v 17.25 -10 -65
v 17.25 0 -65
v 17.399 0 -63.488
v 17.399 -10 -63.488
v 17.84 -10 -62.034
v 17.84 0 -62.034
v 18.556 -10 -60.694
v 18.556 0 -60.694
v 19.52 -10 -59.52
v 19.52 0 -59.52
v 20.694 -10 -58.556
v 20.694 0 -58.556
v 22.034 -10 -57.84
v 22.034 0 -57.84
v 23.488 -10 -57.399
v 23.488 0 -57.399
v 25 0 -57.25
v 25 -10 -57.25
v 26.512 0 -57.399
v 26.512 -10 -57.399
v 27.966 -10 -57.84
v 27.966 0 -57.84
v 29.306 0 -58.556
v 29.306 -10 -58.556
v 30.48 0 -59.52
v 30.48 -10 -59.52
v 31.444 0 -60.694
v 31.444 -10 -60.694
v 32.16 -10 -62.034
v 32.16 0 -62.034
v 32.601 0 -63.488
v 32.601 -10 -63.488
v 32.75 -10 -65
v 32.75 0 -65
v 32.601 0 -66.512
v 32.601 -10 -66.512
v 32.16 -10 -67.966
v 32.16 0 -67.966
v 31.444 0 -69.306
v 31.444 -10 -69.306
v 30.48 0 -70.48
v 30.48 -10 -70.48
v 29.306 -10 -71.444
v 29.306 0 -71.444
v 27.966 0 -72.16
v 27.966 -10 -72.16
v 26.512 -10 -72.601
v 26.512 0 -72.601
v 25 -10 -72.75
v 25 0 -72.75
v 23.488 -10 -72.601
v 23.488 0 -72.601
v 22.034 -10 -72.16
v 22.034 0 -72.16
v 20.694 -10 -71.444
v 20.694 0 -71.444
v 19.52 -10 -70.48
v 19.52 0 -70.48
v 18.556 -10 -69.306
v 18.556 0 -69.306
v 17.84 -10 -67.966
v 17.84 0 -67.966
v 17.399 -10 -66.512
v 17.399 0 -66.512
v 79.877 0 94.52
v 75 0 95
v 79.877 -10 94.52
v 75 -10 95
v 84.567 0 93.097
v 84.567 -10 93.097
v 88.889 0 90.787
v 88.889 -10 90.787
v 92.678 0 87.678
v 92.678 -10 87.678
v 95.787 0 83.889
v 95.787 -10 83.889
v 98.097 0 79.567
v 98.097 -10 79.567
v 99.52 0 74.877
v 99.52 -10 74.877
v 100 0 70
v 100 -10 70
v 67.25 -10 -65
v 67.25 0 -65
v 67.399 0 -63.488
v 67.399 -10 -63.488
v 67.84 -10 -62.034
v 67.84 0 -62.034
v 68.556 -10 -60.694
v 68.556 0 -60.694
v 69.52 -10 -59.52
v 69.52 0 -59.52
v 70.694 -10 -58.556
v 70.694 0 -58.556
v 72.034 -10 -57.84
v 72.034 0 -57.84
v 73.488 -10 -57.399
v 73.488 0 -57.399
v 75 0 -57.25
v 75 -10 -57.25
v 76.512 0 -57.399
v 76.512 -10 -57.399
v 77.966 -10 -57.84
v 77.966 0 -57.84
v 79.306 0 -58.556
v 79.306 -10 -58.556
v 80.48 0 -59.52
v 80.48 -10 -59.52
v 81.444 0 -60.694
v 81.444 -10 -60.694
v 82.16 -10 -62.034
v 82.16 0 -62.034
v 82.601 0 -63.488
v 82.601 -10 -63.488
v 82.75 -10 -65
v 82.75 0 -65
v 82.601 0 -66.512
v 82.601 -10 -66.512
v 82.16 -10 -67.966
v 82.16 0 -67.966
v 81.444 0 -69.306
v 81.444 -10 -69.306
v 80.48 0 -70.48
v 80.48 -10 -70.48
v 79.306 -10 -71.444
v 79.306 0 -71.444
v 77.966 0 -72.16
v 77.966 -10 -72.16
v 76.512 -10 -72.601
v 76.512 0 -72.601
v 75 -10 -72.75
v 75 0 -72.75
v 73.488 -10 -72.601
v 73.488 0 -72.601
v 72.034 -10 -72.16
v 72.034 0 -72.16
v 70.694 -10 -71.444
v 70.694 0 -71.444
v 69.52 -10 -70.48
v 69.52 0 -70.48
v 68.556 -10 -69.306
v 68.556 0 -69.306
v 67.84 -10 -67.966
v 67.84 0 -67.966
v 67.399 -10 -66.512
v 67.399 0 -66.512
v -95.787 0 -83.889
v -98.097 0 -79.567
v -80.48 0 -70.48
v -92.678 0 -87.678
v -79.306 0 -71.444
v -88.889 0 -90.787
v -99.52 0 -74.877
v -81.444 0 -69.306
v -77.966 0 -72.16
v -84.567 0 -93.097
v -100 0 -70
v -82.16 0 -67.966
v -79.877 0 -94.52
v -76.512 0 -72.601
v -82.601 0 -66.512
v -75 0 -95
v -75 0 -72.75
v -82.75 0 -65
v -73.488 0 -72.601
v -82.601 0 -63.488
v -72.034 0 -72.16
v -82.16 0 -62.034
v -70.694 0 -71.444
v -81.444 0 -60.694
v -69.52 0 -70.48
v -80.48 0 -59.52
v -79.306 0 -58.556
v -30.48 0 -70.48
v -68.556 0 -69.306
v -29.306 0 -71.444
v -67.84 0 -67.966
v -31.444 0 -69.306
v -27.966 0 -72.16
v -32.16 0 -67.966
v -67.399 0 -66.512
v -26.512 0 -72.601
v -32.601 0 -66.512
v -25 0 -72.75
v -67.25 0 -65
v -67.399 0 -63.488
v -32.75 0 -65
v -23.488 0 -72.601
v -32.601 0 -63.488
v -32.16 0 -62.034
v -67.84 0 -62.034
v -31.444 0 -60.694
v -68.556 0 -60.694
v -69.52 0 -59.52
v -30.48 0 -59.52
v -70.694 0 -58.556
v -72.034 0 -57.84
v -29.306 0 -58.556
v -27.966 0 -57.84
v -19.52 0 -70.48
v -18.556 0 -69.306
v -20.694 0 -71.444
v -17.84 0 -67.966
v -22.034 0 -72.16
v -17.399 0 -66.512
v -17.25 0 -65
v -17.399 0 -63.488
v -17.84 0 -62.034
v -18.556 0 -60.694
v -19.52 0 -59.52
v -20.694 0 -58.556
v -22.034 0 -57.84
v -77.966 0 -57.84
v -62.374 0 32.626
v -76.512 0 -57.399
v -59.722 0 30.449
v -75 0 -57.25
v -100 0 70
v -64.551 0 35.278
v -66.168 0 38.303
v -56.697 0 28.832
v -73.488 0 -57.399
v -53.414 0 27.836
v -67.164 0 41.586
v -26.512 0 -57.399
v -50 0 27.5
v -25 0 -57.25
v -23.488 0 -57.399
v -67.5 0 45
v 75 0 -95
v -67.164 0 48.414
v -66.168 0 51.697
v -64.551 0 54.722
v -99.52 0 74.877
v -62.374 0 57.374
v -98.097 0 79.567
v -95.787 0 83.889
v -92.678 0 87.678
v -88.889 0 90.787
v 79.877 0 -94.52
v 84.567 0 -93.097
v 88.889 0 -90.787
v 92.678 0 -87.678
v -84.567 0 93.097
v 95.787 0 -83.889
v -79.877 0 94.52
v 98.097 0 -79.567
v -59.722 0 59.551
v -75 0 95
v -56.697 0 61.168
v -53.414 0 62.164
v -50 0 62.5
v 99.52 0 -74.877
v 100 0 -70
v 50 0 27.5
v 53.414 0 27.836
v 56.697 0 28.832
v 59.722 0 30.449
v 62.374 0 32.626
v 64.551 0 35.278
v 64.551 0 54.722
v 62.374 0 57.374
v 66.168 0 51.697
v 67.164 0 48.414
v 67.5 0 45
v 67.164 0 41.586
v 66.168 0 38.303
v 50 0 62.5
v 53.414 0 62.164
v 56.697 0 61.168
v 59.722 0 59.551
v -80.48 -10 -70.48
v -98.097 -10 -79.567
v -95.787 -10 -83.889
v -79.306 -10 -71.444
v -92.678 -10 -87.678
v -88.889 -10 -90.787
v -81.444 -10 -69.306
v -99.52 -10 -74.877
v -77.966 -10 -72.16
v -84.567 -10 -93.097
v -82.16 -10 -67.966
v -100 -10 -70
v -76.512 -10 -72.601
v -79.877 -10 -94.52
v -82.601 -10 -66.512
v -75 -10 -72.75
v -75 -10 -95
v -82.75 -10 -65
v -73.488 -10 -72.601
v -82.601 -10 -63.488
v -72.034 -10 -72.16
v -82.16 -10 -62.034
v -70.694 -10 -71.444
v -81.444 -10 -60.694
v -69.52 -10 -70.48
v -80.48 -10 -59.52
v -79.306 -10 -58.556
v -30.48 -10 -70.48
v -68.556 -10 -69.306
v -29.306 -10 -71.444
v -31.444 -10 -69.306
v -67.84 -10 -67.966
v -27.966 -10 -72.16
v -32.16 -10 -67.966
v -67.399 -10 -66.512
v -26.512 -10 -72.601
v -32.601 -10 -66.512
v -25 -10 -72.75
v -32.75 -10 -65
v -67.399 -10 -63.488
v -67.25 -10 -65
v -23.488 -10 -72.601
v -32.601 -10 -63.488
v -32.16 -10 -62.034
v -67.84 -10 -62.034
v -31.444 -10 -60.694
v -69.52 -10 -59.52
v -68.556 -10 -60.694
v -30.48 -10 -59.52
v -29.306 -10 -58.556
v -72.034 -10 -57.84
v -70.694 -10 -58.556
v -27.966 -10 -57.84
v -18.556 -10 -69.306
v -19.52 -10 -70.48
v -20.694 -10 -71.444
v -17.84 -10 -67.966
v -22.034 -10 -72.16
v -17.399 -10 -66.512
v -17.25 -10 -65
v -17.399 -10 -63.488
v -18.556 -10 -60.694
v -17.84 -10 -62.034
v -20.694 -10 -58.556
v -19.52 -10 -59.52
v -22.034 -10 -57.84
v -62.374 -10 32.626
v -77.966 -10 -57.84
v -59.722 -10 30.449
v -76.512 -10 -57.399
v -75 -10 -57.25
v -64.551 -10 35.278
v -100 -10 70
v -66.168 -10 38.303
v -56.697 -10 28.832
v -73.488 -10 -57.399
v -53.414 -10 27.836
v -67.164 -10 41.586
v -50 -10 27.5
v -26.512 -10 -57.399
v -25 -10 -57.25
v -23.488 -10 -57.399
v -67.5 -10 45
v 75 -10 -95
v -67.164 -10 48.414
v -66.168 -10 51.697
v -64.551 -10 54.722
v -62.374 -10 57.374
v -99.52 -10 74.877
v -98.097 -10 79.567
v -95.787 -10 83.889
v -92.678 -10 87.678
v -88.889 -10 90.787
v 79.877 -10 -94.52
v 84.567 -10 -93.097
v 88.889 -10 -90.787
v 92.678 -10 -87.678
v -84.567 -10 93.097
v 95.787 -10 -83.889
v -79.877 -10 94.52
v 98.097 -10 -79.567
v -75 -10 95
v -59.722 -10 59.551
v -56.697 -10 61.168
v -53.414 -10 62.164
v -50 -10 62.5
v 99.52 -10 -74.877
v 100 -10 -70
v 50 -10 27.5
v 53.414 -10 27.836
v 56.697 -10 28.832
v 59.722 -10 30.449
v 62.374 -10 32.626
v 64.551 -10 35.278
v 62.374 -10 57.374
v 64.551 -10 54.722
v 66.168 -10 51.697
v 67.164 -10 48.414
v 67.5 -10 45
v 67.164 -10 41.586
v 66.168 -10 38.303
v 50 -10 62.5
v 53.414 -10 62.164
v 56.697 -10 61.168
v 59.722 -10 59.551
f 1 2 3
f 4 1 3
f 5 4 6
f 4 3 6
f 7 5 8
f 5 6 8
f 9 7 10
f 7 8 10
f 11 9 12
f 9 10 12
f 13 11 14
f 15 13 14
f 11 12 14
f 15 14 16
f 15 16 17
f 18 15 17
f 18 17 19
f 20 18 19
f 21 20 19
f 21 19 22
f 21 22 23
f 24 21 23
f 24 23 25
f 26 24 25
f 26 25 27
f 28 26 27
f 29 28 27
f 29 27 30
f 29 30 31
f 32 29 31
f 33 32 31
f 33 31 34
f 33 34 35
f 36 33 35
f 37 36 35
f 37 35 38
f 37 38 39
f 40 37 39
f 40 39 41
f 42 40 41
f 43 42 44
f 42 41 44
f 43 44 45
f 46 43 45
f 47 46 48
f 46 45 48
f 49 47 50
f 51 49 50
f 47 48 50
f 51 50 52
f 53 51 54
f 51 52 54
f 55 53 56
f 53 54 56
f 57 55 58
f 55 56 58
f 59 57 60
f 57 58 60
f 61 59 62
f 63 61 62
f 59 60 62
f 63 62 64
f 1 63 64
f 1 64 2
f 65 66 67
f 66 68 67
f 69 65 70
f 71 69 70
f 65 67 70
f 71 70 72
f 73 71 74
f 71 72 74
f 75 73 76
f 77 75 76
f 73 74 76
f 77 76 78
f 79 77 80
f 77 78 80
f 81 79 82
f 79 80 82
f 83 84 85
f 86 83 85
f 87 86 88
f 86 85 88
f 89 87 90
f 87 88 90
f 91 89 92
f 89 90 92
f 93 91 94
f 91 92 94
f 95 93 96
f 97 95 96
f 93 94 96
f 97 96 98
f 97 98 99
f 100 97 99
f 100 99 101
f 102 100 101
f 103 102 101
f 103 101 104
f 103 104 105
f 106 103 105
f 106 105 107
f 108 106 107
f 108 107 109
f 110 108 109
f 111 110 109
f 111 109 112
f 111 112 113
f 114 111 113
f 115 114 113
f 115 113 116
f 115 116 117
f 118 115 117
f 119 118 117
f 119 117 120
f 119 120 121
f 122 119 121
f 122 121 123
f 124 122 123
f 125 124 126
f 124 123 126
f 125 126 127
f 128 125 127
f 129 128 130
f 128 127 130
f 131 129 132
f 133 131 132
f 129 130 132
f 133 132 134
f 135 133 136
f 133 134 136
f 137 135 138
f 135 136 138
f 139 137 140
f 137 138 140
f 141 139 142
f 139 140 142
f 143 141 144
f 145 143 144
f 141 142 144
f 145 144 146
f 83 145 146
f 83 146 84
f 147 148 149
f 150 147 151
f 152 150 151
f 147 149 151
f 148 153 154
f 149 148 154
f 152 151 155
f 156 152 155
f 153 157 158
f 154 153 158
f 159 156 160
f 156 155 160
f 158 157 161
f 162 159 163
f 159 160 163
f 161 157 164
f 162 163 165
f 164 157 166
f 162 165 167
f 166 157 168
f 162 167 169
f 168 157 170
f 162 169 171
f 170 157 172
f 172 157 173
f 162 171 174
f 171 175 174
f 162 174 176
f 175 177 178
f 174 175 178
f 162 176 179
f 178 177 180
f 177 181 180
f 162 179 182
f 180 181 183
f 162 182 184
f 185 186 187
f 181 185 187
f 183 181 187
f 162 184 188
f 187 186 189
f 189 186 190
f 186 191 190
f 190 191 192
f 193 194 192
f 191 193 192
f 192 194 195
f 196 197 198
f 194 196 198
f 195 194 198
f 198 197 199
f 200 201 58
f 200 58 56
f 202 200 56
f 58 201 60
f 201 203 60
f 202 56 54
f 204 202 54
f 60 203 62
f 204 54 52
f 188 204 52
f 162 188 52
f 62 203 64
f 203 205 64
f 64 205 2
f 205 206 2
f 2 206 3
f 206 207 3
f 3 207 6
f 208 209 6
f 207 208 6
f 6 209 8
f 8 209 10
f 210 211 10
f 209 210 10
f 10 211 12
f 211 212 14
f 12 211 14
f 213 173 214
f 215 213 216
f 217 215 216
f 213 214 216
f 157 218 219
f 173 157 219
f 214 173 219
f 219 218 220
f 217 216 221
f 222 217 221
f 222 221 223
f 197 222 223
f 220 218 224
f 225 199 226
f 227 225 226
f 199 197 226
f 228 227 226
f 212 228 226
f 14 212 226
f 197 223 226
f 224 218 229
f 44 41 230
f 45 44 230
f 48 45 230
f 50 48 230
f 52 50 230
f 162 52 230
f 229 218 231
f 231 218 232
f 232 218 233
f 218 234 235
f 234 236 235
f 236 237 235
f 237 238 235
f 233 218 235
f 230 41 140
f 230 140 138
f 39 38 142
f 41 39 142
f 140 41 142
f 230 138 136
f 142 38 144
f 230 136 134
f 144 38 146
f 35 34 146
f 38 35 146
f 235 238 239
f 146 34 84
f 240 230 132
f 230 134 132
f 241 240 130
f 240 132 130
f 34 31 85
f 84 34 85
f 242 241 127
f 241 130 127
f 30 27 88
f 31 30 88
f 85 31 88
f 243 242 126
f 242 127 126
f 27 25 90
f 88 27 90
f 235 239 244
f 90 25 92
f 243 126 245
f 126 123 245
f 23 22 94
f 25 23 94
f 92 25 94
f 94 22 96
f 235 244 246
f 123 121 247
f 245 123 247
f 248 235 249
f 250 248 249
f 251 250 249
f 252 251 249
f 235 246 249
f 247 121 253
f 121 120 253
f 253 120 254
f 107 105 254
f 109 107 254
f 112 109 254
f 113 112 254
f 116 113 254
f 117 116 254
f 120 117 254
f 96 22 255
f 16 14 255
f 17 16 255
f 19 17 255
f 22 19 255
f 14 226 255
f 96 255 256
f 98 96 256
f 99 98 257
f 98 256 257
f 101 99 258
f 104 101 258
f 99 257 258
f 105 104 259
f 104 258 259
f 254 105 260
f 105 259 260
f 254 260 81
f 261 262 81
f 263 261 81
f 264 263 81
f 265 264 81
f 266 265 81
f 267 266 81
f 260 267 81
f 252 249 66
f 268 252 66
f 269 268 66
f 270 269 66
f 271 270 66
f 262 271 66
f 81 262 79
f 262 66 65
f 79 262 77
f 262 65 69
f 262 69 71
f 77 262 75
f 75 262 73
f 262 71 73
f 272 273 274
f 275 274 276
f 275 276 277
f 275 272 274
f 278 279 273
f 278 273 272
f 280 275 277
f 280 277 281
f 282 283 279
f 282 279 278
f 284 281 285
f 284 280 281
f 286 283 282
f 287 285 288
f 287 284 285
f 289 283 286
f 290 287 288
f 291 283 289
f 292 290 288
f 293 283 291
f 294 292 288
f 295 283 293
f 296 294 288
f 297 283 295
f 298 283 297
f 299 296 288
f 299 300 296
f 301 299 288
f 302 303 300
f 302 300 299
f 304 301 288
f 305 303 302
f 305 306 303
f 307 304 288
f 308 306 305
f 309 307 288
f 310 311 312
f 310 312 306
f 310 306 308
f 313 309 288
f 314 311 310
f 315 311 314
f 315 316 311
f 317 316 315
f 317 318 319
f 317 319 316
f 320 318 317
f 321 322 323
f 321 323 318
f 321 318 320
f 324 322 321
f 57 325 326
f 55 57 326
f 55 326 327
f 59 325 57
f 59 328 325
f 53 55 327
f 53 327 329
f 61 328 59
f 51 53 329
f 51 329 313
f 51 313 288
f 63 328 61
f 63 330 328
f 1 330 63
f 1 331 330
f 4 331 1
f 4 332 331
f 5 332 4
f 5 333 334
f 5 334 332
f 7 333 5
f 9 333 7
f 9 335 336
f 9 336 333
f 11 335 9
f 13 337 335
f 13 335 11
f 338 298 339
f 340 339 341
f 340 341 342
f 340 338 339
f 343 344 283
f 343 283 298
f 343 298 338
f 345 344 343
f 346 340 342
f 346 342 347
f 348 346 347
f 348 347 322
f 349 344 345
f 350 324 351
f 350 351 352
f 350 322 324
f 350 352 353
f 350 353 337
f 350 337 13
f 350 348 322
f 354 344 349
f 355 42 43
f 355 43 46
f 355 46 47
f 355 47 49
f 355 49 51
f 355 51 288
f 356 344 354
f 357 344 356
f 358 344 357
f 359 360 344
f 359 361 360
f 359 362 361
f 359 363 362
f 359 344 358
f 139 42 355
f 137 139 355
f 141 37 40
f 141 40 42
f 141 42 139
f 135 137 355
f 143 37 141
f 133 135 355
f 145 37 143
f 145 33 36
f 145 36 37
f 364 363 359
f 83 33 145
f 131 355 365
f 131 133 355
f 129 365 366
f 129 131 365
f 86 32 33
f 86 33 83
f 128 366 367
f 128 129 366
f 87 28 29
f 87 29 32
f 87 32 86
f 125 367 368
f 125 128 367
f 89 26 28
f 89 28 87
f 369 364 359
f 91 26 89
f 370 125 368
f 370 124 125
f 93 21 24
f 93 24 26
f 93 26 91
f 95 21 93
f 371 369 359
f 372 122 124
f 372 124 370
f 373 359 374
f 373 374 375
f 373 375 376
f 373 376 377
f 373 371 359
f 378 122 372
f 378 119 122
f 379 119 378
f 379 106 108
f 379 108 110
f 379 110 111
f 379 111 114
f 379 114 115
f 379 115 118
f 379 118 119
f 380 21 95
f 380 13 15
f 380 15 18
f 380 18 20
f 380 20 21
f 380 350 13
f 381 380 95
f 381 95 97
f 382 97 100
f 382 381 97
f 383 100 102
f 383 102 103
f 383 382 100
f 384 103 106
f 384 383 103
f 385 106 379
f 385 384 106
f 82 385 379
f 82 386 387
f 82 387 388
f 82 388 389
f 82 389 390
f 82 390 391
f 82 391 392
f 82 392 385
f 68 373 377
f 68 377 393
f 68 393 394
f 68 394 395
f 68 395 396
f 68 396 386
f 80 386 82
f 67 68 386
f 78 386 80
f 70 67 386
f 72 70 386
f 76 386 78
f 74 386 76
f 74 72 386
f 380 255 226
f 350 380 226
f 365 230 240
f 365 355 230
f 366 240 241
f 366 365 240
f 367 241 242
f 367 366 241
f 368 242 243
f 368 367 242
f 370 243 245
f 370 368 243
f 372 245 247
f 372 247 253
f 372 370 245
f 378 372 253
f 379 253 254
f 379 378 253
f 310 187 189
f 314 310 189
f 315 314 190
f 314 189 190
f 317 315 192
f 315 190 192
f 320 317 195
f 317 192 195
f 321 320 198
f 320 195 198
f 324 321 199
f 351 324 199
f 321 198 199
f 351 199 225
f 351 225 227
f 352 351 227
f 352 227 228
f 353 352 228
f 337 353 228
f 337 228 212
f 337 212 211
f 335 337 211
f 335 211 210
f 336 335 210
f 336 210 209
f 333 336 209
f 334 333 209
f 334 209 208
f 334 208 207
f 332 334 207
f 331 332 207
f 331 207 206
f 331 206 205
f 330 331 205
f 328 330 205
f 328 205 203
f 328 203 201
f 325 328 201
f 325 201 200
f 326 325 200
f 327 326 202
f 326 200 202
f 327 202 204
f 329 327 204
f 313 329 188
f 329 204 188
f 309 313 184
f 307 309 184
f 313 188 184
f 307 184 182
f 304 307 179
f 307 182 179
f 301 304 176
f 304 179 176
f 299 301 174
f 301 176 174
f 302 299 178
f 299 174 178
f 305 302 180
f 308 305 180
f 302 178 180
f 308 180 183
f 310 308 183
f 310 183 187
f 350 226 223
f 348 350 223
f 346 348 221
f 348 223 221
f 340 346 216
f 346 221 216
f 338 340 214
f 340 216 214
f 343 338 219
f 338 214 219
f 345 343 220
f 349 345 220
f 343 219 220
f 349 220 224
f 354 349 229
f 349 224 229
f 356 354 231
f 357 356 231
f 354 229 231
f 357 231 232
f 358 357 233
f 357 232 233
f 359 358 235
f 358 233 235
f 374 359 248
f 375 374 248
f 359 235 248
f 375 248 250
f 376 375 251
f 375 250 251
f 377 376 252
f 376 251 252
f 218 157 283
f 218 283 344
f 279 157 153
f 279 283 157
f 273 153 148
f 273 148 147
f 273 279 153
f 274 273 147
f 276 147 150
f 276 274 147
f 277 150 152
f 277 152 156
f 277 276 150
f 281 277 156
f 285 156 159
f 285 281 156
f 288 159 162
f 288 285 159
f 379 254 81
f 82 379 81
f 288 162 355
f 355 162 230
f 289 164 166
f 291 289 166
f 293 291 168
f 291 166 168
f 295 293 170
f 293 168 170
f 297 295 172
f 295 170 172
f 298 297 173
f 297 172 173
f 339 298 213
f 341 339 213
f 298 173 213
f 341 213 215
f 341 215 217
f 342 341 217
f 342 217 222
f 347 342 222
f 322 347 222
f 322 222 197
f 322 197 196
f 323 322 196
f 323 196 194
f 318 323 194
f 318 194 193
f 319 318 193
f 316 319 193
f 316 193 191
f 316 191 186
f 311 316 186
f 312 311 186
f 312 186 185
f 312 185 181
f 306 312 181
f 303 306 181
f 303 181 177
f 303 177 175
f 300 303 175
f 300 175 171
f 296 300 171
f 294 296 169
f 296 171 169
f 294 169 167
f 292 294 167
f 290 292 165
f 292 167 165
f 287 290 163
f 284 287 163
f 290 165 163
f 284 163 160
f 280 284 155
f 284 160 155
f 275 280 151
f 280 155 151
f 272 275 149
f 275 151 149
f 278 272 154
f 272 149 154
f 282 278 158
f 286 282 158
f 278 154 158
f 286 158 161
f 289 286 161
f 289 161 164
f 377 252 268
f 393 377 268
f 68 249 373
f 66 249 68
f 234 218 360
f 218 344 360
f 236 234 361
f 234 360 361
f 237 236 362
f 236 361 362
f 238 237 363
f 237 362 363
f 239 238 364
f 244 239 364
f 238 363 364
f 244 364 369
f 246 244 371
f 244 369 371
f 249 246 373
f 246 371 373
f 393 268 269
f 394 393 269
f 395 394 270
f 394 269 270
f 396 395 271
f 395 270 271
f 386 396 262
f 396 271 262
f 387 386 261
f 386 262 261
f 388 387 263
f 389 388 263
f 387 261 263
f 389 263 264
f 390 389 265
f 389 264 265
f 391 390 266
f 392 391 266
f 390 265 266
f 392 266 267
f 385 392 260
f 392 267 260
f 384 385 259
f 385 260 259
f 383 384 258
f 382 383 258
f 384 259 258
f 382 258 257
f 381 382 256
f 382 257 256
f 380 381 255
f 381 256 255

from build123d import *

# Parameters (mm, degrees)
F0_W     = 200
F0_H     = 190
F1_DEPTH = 10
F3_D     = 15.5
F4_R     = 25


with BuildPart() as f1:
    # F0 (on Front) → F1 (new body)
    with BuildSketch(Plane.XZ):
        Rectangle(F0_W, F0_H)
        with BuildLine():
            ThreePointArc((-50, 27.5), (-67.5, 45), (-50, 62.5))
            Line((-50, 62.5), (50, 62.5))
            ThreePointArc((50, 62.5), (67.5, 45), (50, 27.5))
            Line((50, 27.5), (-50, 27.5))
        make_face(mode=Mode.SUBTRACT)
    extrude(amount=F1_DEPTH)

    # F3 (through all)
    with Locations(Plane.XZ.offset(10)):
        with Locations((-75, -65), (-25, -65), (25, -65), (75, -65)):
            Hole(F3_D / 2)

    # F4
    f4_edges = [f1.edges().sort_by_distance(p)[0] for p in [
        (100, -5, 95),
        (-100, -5, 95),
        (100, -5, -95),
        (-100, -5, -95),
    ]]
    fillet(f4_edges, radius=F4_R)


solid = f1.part
